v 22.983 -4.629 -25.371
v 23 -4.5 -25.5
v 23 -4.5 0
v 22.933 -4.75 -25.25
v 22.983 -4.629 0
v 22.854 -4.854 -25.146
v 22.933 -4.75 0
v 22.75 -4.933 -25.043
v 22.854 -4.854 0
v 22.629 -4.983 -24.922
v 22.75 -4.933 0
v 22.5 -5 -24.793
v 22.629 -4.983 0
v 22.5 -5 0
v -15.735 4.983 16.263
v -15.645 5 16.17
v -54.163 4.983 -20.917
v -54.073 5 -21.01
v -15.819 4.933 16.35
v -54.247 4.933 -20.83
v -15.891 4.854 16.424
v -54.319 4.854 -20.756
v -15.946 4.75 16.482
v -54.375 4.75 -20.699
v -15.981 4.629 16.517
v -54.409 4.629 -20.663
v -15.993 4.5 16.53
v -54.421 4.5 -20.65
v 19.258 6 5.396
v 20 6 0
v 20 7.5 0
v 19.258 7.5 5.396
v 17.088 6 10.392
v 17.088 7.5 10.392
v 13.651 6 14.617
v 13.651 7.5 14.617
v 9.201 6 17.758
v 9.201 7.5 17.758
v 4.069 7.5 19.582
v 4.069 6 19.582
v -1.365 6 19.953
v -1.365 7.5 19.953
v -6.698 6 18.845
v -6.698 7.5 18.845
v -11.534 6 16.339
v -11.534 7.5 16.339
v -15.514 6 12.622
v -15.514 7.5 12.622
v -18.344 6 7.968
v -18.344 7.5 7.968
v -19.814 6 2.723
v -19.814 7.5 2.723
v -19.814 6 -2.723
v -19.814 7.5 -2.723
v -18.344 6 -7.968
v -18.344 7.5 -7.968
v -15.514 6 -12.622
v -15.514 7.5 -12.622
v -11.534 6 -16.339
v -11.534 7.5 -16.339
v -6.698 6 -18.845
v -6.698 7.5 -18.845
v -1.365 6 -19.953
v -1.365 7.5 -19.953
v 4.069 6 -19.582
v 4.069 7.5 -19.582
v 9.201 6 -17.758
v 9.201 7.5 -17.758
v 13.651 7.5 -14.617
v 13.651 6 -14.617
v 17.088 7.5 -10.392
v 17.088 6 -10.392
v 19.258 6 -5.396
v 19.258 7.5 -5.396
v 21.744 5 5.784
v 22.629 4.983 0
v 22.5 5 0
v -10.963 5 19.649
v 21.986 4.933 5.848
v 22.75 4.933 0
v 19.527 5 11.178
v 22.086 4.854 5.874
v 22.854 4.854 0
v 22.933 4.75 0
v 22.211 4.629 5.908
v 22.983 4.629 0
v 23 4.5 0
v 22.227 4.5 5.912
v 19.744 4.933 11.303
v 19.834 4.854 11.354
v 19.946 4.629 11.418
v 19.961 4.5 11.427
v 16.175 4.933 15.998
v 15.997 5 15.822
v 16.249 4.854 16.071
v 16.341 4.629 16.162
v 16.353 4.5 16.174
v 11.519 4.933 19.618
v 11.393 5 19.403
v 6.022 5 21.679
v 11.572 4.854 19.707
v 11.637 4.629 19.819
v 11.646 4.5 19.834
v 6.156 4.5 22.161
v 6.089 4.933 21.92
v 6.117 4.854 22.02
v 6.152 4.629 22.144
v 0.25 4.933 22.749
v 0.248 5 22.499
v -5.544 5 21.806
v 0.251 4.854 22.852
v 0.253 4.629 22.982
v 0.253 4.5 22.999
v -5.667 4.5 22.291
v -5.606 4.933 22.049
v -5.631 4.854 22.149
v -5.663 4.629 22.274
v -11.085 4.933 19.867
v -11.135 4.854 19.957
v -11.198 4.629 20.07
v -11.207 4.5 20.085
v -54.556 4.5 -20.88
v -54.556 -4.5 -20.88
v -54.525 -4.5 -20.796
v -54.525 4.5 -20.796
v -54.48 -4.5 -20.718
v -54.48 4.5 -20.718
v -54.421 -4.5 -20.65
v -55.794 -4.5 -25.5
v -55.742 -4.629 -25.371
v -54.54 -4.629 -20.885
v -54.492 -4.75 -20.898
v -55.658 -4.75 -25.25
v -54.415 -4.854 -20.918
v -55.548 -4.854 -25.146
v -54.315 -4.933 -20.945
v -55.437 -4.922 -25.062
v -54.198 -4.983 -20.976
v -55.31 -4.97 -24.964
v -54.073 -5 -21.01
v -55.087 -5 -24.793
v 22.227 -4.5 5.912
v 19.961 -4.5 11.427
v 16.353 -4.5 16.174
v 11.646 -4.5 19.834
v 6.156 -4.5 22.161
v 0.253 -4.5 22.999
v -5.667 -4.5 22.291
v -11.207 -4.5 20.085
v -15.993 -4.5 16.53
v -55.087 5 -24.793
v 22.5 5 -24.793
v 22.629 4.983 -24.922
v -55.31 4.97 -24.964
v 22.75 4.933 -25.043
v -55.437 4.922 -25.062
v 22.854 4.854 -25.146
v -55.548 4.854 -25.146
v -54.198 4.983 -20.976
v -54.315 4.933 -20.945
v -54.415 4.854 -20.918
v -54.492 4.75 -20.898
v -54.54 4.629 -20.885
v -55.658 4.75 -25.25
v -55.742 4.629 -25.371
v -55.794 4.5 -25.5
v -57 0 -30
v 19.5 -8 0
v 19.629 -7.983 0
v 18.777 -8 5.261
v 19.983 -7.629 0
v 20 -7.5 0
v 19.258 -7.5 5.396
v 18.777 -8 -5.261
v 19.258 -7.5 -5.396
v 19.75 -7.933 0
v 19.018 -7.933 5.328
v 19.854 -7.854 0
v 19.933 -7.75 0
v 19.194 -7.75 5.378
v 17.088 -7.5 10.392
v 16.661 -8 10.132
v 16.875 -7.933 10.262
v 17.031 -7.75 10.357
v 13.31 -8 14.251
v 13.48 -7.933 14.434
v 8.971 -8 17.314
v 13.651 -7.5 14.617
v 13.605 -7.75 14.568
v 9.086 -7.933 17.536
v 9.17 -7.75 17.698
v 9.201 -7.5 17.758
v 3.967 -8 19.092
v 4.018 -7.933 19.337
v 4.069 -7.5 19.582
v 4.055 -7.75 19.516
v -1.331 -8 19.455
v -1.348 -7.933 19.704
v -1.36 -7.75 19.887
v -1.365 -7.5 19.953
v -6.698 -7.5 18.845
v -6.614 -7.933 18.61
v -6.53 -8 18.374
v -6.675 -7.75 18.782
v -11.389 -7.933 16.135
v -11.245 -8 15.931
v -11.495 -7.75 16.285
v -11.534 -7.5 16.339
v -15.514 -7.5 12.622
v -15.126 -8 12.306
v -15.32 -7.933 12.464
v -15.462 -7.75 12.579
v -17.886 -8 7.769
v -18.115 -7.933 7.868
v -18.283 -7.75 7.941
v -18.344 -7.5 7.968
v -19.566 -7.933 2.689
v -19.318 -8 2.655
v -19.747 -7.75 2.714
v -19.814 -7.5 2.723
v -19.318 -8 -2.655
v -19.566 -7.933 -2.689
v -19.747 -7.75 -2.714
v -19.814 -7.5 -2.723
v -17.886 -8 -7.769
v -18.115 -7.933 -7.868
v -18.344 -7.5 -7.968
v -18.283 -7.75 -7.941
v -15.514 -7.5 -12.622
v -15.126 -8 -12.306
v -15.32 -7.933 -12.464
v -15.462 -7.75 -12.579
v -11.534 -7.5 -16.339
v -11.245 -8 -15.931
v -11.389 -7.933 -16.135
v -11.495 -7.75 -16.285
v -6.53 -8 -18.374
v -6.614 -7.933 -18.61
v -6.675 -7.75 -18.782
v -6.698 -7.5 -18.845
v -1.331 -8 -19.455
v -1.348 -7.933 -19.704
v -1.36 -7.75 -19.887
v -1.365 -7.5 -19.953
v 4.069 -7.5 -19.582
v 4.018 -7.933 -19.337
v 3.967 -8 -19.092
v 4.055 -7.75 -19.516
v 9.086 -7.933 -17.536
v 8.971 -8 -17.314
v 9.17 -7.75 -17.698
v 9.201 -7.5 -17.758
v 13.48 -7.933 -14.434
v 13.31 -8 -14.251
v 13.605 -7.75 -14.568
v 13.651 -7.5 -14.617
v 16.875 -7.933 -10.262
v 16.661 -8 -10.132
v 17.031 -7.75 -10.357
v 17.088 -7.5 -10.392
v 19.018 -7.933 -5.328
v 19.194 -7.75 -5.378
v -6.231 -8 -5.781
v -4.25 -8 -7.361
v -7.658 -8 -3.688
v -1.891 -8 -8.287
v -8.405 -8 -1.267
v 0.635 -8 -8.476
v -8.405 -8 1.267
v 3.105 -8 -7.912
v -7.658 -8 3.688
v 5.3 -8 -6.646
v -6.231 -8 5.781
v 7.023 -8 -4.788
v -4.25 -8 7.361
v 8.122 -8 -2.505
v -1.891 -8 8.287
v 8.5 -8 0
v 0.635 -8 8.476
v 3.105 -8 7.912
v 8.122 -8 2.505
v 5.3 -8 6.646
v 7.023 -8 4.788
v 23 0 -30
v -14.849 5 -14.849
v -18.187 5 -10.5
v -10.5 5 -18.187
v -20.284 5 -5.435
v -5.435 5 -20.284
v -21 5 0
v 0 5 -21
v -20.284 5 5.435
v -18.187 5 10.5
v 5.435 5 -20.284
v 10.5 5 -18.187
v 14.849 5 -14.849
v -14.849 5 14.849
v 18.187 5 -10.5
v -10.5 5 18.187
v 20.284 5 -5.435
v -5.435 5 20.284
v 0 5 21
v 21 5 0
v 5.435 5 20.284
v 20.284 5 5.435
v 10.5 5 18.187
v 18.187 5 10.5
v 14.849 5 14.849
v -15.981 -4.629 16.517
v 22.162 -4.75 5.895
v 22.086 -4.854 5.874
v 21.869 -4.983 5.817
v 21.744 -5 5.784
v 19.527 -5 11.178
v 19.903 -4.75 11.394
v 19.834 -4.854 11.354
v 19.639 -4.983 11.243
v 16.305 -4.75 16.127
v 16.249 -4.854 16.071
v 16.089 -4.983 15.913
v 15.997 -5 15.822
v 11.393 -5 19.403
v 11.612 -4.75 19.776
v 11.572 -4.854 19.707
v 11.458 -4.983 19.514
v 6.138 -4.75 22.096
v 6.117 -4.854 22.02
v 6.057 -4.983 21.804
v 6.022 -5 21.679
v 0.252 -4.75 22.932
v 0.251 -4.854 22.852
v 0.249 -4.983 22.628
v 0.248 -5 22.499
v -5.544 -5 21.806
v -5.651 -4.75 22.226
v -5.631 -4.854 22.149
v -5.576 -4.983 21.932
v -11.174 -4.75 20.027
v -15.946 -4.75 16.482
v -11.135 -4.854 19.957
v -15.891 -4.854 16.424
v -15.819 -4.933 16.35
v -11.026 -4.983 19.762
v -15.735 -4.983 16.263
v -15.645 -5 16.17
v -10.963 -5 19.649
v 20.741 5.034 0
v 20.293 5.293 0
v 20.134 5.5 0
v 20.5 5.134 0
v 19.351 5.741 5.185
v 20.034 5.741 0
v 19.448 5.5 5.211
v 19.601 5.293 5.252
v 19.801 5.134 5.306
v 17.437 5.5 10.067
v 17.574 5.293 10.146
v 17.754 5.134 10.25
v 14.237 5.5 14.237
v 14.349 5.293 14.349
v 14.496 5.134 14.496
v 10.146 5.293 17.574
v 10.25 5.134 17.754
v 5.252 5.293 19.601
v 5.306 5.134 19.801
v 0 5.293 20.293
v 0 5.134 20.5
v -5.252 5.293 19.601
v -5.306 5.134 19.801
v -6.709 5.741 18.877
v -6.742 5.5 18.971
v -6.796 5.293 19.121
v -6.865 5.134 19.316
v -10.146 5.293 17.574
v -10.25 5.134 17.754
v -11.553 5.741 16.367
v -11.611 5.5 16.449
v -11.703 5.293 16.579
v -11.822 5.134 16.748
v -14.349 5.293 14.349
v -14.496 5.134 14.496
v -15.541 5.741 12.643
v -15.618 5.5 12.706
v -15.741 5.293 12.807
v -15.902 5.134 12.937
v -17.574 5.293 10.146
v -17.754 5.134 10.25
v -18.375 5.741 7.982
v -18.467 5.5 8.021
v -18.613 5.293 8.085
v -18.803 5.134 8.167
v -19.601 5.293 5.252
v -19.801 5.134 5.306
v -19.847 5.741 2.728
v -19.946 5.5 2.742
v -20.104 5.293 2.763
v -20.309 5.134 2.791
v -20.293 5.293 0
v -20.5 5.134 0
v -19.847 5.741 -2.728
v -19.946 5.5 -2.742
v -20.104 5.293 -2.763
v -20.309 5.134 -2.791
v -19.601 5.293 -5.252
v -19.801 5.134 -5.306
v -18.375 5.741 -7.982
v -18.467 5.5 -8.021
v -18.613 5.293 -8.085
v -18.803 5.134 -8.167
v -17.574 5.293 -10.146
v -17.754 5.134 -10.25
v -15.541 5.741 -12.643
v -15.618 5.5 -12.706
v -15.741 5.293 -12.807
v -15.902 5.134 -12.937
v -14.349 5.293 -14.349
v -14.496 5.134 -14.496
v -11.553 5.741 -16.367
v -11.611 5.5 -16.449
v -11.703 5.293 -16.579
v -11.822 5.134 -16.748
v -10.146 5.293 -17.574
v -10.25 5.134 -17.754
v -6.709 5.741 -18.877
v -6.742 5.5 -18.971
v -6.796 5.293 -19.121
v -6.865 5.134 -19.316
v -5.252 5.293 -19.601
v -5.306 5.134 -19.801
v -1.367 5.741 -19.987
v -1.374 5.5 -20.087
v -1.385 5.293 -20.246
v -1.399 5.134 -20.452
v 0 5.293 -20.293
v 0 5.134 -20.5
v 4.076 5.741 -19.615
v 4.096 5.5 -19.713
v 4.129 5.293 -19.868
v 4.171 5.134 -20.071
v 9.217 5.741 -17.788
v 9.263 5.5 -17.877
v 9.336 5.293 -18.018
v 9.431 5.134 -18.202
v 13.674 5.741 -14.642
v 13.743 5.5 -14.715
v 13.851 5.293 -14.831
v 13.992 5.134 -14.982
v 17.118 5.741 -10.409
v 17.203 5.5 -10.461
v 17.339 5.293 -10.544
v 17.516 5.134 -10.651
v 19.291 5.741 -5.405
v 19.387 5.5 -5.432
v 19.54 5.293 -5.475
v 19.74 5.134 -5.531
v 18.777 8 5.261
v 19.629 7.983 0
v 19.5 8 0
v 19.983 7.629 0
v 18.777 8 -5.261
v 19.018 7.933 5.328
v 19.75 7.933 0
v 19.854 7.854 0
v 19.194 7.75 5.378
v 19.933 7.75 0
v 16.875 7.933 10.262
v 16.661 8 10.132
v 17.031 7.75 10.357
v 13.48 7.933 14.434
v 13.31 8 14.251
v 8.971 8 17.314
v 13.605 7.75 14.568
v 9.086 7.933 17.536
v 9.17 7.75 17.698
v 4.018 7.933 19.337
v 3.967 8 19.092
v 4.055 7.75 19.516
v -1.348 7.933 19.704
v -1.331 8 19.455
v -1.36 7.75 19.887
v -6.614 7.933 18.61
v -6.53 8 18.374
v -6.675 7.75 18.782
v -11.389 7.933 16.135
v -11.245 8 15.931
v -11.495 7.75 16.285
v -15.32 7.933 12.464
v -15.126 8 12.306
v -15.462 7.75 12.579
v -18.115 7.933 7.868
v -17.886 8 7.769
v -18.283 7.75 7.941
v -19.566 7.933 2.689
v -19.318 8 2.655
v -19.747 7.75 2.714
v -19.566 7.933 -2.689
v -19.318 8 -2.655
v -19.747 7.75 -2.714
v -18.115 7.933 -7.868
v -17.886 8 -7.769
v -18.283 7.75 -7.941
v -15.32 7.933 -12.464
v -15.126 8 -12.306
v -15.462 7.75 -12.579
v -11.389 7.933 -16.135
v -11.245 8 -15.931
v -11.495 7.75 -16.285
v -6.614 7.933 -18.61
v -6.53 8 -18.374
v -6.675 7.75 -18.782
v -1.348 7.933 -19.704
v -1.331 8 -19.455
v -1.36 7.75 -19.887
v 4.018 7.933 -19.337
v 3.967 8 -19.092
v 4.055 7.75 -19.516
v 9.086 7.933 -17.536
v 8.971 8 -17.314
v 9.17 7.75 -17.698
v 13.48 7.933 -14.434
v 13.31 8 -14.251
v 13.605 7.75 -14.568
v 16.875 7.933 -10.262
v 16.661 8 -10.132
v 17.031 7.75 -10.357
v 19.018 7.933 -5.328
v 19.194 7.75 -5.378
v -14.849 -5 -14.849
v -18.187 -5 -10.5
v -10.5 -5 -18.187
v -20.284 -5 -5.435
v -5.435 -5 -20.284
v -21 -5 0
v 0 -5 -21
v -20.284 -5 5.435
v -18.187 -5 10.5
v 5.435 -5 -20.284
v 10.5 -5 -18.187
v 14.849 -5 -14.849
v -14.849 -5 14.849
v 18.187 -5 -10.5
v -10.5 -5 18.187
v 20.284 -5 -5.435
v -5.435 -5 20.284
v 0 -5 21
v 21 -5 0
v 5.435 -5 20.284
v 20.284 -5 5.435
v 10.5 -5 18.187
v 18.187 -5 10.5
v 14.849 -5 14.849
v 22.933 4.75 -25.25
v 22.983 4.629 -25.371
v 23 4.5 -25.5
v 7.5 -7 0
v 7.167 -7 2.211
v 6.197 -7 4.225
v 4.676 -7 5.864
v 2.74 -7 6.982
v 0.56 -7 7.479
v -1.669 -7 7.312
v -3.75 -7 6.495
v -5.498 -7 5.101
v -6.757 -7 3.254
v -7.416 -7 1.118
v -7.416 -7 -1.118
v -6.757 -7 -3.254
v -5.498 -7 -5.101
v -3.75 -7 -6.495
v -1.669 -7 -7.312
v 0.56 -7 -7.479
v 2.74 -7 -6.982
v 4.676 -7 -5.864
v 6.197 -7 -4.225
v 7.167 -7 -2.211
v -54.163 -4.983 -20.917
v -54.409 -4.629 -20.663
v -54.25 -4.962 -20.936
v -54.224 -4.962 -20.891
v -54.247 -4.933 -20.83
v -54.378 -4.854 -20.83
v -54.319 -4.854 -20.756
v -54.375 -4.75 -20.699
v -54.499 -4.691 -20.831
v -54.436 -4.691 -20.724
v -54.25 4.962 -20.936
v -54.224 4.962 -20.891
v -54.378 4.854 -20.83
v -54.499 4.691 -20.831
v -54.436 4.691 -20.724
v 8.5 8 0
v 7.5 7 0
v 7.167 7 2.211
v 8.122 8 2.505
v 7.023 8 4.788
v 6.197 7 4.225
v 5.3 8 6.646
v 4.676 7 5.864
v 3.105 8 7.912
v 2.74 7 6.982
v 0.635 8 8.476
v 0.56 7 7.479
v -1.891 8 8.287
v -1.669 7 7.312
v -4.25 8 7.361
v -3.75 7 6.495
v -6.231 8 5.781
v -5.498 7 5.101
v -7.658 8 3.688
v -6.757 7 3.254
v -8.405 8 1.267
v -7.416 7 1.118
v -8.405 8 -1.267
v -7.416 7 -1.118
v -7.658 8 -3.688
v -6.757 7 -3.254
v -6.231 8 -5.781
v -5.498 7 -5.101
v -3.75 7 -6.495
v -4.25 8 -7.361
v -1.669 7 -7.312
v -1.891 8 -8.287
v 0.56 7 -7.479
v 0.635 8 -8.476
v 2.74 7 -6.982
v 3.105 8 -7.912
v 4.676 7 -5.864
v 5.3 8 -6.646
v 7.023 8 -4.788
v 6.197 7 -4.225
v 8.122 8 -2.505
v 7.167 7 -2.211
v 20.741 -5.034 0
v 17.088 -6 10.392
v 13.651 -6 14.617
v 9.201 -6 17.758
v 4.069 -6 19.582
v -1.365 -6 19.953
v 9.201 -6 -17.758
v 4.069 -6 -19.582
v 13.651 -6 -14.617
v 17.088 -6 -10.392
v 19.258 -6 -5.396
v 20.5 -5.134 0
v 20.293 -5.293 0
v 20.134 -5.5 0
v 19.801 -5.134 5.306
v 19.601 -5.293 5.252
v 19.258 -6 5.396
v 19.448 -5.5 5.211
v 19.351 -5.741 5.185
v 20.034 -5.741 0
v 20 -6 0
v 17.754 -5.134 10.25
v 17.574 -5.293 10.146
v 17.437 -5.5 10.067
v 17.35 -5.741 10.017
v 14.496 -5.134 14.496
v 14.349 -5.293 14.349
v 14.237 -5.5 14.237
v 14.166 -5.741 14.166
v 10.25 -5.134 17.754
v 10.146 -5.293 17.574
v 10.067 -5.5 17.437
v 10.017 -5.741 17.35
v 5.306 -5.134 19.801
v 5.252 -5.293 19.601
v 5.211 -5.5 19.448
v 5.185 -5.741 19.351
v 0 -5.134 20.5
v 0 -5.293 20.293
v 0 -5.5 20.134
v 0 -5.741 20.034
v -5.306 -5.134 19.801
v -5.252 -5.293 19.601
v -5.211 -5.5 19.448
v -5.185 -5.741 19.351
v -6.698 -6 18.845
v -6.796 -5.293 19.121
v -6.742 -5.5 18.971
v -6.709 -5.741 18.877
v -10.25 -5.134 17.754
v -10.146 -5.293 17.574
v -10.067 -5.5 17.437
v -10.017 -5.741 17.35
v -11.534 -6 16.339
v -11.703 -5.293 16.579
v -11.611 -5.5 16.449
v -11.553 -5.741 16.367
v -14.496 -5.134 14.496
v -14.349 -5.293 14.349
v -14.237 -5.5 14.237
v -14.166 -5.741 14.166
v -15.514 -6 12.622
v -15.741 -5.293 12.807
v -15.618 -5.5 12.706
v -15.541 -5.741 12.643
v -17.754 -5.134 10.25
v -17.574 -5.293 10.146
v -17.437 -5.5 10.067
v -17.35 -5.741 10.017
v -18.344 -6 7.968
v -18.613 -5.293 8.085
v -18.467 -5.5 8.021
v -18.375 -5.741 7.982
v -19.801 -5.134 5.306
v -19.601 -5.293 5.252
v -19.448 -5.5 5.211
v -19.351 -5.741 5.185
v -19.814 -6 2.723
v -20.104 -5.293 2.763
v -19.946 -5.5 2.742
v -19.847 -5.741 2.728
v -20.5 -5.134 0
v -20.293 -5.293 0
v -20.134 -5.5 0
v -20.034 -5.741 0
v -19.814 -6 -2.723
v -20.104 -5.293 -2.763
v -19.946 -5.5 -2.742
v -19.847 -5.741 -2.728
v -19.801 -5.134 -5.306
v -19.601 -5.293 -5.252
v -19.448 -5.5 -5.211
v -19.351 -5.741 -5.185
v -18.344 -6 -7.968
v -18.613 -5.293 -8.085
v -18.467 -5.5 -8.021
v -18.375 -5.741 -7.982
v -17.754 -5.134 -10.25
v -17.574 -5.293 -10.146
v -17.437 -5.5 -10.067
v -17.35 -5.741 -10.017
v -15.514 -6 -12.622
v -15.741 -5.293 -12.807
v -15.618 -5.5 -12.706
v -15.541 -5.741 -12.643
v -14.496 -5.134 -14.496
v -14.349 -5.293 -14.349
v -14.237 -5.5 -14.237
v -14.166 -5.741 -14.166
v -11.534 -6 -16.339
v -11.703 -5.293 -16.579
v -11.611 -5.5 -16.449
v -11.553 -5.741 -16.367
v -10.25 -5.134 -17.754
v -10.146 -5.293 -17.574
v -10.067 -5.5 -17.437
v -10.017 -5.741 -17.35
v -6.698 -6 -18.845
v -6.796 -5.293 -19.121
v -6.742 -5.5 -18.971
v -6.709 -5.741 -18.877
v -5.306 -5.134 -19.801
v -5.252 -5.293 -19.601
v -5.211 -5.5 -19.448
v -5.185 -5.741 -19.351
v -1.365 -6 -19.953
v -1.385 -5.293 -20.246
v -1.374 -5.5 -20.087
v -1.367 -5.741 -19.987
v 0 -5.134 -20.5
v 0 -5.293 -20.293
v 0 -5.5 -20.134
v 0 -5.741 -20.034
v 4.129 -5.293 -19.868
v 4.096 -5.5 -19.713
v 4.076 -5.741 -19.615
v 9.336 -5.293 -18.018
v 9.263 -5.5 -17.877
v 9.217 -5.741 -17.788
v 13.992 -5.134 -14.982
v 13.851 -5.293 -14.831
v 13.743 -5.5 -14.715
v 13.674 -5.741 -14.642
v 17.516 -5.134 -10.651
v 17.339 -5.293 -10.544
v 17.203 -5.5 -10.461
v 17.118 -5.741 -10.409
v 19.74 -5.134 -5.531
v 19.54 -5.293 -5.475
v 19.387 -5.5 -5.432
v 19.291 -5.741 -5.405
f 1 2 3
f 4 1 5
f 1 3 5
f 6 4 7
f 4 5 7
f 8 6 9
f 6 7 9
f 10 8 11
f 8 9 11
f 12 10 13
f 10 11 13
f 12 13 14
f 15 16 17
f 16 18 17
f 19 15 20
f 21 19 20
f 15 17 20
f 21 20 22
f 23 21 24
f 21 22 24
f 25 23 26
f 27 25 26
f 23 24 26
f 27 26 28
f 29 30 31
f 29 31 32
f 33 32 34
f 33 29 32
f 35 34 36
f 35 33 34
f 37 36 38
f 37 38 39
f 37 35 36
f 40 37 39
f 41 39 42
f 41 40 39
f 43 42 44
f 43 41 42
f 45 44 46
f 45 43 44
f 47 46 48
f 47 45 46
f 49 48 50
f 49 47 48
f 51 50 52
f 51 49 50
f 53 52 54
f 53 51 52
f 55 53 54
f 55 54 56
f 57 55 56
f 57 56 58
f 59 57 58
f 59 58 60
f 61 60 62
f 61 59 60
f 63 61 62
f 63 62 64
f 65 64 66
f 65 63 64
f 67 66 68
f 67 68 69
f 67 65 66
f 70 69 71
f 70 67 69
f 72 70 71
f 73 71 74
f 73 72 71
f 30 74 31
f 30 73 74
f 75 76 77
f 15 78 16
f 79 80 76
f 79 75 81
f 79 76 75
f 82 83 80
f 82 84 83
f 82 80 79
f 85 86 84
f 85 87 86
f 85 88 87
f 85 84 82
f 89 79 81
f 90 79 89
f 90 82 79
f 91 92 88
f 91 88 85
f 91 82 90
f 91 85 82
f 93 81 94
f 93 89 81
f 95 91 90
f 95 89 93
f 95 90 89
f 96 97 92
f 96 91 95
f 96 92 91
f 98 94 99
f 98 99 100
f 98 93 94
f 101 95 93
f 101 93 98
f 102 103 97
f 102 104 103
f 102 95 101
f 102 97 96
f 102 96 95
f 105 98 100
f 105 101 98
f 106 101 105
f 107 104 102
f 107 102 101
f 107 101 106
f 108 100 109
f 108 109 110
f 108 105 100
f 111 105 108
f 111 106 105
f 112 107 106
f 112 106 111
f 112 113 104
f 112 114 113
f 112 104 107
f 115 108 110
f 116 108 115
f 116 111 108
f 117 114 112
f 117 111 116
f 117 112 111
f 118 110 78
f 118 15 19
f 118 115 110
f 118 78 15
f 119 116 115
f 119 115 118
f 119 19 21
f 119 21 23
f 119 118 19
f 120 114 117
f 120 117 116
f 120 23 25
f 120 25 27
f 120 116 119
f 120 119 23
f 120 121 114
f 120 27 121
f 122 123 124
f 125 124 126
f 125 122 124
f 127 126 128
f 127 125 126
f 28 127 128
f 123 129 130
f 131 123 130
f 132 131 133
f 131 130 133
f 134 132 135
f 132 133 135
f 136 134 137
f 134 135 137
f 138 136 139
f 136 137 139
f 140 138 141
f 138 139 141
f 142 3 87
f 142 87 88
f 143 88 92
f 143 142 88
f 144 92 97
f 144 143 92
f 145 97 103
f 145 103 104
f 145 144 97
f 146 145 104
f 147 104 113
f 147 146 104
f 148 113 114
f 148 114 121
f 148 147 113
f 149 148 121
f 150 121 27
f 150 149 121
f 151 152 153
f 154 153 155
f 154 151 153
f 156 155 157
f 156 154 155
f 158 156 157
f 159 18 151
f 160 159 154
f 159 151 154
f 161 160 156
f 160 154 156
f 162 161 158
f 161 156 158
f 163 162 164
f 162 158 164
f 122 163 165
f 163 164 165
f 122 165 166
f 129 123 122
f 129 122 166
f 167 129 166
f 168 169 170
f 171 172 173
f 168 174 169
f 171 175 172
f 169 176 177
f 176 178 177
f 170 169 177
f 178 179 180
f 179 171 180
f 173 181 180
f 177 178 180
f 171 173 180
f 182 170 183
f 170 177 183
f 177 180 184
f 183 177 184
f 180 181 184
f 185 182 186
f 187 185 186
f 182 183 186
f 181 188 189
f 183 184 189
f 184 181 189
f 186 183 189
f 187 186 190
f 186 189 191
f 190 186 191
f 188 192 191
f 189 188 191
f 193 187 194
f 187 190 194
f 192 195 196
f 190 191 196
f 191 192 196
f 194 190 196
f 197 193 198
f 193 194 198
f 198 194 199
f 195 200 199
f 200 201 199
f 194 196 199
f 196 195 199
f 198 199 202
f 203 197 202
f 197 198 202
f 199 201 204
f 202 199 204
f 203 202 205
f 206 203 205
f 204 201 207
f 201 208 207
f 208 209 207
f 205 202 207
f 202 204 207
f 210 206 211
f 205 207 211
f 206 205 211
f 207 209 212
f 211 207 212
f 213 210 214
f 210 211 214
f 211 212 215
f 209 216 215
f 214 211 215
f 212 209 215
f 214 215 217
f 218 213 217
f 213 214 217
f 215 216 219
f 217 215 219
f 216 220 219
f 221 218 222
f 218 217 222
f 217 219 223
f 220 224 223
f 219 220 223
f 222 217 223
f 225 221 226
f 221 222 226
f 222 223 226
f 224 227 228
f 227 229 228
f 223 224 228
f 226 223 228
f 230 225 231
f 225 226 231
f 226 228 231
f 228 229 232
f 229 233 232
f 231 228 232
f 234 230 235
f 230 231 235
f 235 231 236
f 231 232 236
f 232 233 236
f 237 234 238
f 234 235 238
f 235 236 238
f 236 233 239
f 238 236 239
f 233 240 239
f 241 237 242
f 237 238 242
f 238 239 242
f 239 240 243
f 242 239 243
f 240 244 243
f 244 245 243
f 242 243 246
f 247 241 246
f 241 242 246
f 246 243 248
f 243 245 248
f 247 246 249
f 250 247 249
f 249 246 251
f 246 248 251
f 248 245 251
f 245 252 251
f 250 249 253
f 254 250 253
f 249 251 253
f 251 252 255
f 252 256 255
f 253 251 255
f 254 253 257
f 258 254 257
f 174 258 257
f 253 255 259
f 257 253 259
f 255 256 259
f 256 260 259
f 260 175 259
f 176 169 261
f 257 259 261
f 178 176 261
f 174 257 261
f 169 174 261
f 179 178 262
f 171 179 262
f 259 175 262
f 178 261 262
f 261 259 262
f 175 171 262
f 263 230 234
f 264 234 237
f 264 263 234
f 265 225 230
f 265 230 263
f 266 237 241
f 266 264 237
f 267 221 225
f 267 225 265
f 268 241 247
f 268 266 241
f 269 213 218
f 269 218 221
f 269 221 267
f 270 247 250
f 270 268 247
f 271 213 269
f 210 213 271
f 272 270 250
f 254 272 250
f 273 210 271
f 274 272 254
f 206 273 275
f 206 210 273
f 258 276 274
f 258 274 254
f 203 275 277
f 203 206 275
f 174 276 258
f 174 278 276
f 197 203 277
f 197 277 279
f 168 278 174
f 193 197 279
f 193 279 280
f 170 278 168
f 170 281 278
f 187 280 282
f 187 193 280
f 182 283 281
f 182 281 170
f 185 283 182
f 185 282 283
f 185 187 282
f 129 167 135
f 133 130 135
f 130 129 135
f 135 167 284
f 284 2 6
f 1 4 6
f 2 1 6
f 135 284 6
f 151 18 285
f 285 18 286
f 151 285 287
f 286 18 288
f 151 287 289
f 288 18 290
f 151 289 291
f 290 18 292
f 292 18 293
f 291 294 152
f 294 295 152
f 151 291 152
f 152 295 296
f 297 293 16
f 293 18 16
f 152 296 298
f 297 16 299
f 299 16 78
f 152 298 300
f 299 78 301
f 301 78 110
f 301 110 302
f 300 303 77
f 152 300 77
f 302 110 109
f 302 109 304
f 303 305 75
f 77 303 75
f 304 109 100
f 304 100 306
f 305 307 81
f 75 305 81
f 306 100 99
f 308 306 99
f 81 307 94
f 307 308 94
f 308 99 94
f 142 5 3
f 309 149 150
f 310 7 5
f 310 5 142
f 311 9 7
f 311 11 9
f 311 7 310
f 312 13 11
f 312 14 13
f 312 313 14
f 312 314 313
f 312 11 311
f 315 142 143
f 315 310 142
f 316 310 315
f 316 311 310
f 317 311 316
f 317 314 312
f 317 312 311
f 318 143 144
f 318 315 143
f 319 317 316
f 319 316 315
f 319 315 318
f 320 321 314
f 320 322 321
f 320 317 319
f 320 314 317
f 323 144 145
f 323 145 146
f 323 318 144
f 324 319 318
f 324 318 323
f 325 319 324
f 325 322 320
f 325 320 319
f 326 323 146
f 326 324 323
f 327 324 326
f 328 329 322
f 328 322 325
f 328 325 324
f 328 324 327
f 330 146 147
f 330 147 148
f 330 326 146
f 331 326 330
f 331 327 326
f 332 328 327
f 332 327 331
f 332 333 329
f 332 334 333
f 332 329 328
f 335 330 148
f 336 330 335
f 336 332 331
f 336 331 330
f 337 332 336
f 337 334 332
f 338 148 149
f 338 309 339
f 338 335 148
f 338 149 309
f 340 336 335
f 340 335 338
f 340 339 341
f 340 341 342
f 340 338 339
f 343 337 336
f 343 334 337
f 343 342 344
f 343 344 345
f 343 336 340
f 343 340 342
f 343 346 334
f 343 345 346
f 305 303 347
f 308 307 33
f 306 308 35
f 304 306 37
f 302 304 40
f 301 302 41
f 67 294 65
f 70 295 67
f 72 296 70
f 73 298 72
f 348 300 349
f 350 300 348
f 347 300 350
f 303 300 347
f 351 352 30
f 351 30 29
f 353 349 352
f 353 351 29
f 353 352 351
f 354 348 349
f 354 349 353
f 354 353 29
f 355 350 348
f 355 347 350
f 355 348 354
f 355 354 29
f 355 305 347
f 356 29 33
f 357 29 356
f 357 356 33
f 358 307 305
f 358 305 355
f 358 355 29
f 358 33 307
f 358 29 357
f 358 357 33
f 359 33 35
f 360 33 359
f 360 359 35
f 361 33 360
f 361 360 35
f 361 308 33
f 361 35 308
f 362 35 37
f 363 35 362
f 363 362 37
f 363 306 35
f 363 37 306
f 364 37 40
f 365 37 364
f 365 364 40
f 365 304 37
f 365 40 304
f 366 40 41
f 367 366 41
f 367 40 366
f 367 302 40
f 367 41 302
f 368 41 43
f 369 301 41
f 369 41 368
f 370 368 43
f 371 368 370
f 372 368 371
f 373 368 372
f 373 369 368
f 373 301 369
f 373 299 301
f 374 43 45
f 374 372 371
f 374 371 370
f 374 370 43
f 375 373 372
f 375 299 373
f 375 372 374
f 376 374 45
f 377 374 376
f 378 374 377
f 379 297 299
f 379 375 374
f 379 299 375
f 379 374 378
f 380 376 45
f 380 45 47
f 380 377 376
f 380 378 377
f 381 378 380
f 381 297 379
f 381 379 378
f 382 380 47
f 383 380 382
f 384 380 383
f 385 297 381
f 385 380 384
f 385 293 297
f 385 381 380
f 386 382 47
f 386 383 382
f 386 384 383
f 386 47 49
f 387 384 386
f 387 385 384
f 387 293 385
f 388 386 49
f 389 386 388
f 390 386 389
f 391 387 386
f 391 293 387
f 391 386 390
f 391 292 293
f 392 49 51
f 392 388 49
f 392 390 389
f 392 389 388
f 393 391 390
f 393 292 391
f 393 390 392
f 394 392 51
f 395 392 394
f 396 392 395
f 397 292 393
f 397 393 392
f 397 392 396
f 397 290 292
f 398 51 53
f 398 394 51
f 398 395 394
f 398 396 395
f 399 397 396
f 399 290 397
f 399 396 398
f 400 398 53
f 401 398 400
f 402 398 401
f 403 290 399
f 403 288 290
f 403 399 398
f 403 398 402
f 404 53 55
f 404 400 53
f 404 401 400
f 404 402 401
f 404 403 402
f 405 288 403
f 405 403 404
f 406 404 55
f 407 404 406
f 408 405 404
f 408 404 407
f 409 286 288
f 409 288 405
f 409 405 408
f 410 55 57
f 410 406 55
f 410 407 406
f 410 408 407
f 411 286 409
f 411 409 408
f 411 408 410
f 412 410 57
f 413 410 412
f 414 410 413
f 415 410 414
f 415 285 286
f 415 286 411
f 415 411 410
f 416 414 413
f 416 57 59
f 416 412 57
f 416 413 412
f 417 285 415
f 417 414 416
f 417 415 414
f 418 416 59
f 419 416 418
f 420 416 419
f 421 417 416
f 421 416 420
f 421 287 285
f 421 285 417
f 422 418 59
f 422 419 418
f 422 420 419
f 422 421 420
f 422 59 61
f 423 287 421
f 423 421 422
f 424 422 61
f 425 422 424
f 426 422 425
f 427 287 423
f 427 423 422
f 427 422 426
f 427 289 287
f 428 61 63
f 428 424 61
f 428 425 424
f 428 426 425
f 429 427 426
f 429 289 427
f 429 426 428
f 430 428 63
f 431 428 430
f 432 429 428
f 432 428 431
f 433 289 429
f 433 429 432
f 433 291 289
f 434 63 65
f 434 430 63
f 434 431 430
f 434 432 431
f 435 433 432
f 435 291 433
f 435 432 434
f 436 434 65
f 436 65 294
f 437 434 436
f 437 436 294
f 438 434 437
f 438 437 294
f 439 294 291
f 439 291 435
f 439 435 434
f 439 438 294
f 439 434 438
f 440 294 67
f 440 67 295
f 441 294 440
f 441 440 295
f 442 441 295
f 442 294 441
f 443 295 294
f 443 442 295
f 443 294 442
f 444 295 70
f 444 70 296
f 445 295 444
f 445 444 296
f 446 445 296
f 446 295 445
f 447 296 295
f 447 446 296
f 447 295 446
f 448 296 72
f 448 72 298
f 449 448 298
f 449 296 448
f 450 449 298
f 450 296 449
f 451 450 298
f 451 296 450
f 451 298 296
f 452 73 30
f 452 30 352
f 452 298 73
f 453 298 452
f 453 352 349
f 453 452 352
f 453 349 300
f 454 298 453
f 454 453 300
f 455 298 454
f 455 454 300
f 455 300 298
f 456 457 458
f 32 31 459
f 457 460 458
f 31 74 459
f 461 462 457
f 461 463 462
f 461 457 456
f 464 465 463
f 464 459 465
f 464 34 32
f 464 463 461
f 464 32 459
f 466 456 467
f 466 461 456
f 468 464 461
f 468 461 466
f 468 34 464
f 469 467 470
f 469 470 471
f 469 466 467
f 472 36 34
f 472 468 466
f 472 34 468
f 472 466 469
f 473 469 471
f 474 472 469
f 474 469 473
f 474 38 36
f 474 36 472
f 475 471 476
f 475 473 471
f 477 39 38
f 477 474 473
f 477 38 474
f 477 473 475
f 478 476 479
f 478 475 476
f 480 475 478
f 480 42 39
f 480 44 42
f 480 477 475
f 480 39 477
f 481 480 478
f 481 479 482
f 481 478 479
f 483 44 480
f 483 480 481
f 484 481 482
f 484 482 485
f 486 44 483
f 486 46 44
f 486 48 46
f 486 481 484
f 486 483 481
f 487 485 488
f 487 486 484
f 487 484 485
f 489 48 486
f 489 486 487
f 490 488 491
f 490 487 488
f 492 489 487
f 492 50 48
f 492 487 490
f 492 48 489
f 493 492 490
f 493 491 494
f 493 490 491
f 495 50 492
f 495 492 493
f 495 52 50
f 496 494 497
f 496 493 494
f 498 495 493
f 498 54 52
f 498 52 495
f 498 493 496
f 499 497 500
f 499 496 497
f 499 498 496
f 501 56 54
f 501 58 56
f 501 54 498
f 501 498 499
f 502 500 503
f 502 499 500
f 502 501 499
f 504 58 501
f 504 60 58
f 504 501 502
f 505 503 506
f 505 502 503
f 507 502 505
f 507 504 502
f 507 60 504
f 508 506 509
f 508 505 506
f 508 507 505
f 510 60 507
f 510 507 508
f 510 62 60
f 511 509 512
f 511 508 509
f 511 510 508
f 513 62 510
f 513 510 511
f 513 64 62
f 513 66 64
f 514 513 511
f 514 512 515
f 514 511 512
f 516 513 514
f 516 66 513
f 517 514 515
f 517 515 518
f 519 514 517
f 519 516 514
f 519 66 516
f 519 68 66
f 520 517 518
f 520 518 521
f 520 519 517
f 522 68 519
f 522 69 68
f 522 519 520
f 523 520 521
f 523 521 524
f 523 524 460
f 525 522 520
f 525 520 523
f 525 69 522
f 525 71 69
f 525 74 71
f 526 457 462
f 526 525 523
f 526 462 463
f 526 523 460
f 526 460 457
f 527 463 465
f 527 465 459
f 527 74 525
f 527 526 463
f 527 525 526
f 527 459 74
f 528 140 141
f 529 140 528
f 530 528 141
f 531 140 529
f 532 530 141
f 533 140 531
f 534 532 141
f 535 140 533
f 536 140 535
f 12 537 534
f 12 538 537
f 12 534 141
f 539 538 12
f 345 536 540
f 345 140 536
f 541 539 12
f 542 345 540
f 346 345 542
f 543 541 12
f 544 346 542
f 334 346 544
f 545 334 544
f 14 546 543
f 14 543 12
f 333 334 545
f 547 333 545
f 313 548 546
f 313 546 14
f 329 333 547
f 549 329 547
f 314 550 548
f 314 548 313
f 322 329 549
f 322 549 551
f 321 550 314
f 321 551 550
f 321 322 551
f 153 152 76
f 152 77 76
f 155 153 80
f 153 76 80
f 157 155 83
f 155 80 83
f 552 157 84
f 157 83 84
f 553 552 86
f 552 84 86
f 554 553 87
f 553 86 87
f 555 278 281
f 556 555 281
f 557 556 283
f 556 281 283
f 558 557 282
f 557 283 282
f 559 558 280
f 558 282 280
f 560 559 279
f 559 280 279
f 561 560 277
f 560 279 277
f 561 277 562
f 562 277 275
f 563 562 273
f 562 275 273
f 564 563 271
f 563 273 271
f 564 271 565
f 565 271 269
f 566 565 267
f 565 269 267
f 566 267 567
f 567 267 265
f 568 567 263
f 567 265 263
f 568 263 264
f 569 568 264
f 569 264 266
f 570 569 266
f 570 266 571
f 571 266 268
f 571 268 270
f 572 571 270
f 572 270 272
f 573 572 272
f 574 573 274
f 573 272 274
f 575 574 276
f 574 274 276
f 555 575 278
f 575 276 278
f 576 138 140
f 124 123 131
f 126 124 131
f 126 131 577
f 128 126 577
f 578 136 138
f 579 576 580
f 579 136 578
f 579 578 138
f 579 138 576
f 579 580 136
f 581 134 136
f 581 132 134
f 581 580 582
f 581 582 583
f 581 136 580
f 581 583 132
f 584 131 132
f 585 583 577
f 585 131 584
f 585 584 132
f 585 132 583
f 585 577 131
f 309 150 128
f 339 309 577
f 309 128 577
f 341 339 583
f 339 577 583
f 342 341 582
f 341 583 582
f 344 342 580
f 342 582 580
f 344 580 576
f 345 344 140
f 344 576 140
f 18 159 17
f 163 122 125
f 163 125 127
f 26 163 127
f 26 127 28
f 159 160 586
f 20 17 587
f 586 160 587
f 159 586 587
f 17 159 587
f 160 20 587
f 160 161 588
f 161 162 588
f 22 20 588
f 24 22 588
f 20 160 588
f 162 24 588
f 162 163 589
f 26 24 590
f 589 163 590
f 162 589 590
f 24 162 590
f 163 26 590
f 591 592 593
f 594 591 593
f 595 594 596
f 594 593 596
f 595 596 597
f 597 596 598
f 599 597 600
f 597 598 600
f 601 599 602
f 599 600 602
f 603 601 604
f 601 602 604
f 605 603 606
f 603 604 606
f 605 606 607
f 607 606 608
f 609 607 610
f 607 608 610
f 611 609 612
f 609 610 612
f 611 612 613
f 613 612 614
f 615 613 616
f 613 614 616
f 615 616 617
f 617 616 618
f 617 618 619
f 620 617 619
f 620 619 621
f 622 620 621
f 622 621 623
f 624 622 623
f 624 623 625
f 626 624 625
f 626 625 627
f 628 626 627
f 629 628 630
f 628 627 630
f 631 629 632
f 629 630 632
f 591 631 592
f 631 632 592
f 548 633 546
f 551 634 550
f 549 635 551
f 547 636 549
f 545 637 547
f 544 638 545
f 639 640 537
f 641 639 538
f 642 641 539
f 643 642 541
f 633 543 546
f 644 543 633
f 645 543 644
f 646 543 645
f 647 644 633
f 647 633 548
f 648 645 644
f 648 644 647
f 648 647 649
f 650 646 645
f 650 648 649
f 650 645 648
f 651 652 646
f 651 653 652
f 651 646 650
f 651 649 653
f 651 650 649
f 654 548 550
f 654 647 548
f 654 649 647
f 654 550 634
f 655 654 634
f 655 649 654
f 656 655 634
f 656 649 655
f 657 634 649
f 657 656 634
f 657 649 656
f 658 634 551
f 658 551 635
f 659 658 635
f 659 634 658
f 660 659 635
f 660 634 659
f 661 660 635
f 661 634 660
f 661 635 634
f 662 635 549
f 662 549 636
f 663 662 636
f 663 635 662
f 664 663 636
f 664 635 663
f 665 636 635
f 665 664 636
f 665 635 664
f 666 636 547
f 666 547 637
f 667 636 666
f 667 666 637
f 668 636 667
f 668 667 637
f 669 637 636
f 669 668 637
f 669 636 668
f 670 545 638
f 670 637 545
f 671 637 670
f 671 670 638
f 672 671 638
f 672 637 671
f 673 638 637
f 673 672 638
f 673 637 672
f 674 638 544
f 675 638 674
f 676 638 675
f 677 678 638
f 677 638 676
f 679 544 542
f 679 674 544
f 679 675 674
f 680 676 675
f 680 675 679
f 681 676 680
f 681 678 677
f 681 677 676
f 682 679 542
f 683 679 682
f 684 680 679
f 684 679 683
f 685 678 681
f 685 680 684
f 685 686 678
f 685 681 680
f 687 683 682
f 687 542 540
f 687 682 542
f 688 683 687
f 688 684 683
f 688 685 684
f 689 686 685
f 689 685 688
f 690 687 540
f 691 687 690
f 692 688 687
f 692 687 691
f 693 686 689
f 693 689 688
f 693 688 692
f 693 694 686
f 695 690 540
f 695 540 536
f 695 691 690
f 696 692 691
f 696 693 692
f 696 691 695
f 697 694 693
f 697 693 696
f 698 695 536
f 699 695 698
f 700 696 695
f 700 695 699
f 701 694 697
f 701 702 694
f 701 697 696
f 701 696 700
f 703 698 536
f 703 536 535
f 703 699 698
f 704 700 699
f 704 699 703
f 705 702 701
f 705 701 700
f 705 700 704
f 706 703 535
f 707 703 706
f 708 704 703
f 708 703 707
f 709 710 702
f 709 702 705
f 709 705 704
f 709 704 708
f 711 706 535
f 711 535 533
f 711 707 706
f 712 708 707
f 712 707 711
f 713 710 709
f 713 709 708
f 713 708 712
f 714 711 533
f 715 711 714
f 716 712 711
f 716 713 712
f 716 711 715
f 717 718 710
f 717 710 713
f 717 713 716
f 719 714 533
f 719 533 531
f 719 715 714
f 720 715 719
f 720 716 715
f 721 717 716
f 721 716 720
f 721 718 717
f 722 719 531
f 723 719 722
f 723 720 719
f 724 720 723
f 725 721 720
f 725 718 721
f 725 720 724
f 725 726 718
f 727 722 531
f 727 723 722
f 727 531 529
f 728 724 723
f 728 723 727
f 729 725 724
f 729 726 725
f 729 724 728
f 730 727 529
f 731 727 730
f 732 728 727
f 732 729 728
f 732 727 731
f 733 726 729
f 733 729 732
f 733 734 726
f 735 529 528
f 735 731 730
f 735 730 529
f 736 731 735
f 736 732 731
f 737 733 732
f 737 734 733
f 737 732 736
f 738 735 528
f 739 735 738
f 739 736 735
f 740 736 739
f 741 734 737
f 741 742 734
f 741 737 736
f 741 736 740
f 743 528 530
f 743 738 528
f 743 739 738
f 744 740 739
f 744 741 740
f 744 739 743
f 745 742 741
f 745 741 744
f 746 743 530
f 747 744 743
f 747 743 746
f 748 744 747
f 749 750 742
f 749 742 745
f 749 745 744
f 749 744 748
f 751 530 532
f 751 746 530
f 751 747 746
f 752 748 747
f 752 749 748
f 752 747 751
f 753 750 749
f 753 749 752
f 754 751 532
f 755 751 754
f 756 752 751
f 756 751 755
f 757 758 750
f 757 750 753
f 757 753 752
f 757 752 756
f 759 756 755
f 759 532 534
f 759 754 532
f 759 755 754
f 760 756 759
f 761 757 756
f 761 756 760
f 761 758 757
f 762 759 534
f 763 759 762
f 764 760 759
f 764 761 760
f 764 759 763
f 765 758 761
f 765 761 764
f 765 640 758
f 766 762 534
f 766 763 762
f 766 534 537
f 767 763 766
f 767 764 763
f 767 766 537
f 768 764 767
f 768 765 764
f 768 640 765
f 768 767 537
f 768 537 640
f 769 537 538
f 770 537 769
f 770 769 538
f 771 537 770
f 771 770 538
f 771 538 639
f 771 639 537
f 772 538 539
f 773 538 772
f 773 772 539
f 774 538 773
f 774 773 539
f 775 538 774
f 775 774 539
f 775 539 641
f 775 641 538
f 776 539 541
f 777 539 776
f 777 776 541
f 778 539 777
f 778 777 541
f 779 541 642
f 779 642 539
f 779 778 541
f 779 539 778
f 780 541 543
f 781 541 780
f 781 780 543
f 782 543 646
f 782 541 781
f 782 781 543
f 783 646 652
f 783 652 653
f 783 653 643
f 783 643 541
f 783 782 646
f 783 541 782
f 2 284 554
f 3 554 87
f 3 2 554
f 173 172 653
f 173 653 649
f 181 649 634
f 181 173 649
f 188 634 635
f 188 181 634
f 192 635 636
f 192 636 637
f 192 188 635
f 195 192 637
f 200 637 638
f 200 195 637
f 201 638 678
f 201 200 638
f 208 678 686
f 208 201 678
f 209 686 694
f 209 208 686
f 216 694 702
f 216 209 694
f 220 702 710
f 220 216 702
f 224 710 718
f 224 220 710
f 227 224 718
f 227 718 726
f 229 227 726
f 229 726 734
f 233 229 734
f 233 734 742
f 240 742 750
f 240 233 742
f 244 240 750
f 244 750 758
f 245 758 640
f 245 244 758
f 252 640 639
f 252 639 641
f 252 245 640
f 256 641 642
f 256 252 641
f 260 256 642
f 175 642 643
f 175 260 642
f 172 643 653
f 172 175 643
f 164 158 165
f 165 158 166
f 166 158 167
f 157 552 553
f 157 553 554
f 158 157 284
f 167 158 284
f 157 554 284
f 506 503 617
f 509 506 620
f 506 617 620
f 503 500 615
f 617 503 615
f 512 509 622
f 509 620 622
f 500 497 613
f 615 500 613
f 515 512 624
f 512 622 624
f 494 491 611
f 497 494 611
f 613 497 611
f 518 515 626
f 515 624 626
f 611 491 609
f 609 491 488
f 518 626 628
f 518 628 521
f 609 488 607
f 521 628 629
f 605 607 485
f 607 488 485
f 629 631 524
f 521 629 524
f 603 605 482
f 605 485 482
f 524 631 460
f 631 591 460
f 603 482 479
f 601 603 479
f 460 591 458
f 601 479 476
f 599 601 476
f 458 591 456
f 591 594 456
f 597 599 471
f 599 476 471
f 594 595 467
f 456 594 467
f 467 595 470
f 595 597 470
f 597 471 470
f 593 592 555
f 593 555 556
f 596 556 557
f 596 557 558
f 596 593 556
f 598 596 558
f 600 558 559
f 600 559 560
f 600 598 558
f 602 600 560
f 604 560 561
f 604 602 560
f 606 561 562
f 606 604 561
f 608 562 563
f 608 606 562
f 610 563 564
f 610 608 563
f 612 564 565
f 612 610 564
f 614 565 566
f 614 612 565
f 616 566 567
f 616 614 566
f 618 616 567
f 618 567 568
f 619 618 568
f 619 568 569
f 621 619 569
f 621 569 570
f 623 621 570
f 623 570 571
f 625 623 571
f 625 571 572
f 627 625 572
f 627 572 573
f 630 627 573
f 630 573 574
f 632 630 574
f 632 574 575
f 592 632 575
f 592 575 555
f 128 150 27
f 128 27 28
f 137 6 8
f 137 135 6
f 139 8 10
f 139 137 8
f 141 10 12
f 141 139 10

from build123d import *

# Parameters (mm, degrees)
F0_R     = 20
F1_DEPTH = 5
F0_R_2   = 7.5
F2_DEPTH = 8
F3_R     = 1
F4_SIZE  = 1
F6_DEPTH = 80.001
F7_R     = 0.5


with BuildPart() as f1:
    # F0 (on Front) → F1 (new body, symmetric)
    with BuildSketch(Plane.XZ):
        with BuildLine():
            Line((23, -30), (23, 0))
            ThreePointArc((23, 0), (8.9768012825, 21.175859811), (-15.9927859769, 16.5296943922))
            Line((-15.9927859769, 16.5296943922), (-54.5205736666, -20.7466549501))
            Line((-54.5205736666, -20.7466549501), (-57, -30))
            Line((-57, -30), (23, -30))
        make_face()
        Circle(F0_R, mode=Mode.SUBTRACT)
    extrude(amount=F1_DEPTH, both=True)

    # F0 (on Front) → F2 (join, symmetric)
    with BuildSketch(Plane.XZ):
        Circle(F0_R)
        Circle(F0_R_2, mode=Mode.SUBTRACT)
    extrude(amount=F2_DEPTH, both=True)

    # F3
    f3_edges = [f1.edges().sort_by_distance(p)[0] for p in [
        (-20, -5, 0),
        (-20, 5, 0),
    ]]
    fillet(f3_edges, radius=F3_R)

    # F4
    f4_edges = [f1.edges().sort_by_distance(p)[0] for p in [
        (-7.5, -8, 0),
        (7.5, 0, 0),
        (-7.5, 8, 0),
    ]]
    chamfer(f4_edges, length=F4_SIZE)

    # F5 (on face) → F6 (cut, through all)
    with BuildSketch(Plane.YZ.offset(23)):
        Polygon((5, -25), (0, -30), (-5, -25), (-8.4046628326, -25), (-8.4046628326, -34.2726558447), (0, -34.2726558447), (8.4046628326, -34.2726558447), (8.4046628326, -25), align=None)
    extrude(amount=-F6_DEPTH, mode=Mode.SUBTRACT)

    # F7
    f7_edges = [f1.edges().sort_by_distance(p)[0] for p in [
        (-20, -8, 0),
        (-20, 8, 0),
        (-16.330127, 5, -25),
        (-55.090414, 5, -22.873327),
        (-35.25668, 5, -2.10848),
        (-16.330127, -5, -25),
        (-55.090414, -5, -22.873327),
        (23, -5, -12.5),
        (-54.520574, 0, -20.746655),
    ]]
    fillet(f7_edges, radius=F7_R)


solid = f1.part
